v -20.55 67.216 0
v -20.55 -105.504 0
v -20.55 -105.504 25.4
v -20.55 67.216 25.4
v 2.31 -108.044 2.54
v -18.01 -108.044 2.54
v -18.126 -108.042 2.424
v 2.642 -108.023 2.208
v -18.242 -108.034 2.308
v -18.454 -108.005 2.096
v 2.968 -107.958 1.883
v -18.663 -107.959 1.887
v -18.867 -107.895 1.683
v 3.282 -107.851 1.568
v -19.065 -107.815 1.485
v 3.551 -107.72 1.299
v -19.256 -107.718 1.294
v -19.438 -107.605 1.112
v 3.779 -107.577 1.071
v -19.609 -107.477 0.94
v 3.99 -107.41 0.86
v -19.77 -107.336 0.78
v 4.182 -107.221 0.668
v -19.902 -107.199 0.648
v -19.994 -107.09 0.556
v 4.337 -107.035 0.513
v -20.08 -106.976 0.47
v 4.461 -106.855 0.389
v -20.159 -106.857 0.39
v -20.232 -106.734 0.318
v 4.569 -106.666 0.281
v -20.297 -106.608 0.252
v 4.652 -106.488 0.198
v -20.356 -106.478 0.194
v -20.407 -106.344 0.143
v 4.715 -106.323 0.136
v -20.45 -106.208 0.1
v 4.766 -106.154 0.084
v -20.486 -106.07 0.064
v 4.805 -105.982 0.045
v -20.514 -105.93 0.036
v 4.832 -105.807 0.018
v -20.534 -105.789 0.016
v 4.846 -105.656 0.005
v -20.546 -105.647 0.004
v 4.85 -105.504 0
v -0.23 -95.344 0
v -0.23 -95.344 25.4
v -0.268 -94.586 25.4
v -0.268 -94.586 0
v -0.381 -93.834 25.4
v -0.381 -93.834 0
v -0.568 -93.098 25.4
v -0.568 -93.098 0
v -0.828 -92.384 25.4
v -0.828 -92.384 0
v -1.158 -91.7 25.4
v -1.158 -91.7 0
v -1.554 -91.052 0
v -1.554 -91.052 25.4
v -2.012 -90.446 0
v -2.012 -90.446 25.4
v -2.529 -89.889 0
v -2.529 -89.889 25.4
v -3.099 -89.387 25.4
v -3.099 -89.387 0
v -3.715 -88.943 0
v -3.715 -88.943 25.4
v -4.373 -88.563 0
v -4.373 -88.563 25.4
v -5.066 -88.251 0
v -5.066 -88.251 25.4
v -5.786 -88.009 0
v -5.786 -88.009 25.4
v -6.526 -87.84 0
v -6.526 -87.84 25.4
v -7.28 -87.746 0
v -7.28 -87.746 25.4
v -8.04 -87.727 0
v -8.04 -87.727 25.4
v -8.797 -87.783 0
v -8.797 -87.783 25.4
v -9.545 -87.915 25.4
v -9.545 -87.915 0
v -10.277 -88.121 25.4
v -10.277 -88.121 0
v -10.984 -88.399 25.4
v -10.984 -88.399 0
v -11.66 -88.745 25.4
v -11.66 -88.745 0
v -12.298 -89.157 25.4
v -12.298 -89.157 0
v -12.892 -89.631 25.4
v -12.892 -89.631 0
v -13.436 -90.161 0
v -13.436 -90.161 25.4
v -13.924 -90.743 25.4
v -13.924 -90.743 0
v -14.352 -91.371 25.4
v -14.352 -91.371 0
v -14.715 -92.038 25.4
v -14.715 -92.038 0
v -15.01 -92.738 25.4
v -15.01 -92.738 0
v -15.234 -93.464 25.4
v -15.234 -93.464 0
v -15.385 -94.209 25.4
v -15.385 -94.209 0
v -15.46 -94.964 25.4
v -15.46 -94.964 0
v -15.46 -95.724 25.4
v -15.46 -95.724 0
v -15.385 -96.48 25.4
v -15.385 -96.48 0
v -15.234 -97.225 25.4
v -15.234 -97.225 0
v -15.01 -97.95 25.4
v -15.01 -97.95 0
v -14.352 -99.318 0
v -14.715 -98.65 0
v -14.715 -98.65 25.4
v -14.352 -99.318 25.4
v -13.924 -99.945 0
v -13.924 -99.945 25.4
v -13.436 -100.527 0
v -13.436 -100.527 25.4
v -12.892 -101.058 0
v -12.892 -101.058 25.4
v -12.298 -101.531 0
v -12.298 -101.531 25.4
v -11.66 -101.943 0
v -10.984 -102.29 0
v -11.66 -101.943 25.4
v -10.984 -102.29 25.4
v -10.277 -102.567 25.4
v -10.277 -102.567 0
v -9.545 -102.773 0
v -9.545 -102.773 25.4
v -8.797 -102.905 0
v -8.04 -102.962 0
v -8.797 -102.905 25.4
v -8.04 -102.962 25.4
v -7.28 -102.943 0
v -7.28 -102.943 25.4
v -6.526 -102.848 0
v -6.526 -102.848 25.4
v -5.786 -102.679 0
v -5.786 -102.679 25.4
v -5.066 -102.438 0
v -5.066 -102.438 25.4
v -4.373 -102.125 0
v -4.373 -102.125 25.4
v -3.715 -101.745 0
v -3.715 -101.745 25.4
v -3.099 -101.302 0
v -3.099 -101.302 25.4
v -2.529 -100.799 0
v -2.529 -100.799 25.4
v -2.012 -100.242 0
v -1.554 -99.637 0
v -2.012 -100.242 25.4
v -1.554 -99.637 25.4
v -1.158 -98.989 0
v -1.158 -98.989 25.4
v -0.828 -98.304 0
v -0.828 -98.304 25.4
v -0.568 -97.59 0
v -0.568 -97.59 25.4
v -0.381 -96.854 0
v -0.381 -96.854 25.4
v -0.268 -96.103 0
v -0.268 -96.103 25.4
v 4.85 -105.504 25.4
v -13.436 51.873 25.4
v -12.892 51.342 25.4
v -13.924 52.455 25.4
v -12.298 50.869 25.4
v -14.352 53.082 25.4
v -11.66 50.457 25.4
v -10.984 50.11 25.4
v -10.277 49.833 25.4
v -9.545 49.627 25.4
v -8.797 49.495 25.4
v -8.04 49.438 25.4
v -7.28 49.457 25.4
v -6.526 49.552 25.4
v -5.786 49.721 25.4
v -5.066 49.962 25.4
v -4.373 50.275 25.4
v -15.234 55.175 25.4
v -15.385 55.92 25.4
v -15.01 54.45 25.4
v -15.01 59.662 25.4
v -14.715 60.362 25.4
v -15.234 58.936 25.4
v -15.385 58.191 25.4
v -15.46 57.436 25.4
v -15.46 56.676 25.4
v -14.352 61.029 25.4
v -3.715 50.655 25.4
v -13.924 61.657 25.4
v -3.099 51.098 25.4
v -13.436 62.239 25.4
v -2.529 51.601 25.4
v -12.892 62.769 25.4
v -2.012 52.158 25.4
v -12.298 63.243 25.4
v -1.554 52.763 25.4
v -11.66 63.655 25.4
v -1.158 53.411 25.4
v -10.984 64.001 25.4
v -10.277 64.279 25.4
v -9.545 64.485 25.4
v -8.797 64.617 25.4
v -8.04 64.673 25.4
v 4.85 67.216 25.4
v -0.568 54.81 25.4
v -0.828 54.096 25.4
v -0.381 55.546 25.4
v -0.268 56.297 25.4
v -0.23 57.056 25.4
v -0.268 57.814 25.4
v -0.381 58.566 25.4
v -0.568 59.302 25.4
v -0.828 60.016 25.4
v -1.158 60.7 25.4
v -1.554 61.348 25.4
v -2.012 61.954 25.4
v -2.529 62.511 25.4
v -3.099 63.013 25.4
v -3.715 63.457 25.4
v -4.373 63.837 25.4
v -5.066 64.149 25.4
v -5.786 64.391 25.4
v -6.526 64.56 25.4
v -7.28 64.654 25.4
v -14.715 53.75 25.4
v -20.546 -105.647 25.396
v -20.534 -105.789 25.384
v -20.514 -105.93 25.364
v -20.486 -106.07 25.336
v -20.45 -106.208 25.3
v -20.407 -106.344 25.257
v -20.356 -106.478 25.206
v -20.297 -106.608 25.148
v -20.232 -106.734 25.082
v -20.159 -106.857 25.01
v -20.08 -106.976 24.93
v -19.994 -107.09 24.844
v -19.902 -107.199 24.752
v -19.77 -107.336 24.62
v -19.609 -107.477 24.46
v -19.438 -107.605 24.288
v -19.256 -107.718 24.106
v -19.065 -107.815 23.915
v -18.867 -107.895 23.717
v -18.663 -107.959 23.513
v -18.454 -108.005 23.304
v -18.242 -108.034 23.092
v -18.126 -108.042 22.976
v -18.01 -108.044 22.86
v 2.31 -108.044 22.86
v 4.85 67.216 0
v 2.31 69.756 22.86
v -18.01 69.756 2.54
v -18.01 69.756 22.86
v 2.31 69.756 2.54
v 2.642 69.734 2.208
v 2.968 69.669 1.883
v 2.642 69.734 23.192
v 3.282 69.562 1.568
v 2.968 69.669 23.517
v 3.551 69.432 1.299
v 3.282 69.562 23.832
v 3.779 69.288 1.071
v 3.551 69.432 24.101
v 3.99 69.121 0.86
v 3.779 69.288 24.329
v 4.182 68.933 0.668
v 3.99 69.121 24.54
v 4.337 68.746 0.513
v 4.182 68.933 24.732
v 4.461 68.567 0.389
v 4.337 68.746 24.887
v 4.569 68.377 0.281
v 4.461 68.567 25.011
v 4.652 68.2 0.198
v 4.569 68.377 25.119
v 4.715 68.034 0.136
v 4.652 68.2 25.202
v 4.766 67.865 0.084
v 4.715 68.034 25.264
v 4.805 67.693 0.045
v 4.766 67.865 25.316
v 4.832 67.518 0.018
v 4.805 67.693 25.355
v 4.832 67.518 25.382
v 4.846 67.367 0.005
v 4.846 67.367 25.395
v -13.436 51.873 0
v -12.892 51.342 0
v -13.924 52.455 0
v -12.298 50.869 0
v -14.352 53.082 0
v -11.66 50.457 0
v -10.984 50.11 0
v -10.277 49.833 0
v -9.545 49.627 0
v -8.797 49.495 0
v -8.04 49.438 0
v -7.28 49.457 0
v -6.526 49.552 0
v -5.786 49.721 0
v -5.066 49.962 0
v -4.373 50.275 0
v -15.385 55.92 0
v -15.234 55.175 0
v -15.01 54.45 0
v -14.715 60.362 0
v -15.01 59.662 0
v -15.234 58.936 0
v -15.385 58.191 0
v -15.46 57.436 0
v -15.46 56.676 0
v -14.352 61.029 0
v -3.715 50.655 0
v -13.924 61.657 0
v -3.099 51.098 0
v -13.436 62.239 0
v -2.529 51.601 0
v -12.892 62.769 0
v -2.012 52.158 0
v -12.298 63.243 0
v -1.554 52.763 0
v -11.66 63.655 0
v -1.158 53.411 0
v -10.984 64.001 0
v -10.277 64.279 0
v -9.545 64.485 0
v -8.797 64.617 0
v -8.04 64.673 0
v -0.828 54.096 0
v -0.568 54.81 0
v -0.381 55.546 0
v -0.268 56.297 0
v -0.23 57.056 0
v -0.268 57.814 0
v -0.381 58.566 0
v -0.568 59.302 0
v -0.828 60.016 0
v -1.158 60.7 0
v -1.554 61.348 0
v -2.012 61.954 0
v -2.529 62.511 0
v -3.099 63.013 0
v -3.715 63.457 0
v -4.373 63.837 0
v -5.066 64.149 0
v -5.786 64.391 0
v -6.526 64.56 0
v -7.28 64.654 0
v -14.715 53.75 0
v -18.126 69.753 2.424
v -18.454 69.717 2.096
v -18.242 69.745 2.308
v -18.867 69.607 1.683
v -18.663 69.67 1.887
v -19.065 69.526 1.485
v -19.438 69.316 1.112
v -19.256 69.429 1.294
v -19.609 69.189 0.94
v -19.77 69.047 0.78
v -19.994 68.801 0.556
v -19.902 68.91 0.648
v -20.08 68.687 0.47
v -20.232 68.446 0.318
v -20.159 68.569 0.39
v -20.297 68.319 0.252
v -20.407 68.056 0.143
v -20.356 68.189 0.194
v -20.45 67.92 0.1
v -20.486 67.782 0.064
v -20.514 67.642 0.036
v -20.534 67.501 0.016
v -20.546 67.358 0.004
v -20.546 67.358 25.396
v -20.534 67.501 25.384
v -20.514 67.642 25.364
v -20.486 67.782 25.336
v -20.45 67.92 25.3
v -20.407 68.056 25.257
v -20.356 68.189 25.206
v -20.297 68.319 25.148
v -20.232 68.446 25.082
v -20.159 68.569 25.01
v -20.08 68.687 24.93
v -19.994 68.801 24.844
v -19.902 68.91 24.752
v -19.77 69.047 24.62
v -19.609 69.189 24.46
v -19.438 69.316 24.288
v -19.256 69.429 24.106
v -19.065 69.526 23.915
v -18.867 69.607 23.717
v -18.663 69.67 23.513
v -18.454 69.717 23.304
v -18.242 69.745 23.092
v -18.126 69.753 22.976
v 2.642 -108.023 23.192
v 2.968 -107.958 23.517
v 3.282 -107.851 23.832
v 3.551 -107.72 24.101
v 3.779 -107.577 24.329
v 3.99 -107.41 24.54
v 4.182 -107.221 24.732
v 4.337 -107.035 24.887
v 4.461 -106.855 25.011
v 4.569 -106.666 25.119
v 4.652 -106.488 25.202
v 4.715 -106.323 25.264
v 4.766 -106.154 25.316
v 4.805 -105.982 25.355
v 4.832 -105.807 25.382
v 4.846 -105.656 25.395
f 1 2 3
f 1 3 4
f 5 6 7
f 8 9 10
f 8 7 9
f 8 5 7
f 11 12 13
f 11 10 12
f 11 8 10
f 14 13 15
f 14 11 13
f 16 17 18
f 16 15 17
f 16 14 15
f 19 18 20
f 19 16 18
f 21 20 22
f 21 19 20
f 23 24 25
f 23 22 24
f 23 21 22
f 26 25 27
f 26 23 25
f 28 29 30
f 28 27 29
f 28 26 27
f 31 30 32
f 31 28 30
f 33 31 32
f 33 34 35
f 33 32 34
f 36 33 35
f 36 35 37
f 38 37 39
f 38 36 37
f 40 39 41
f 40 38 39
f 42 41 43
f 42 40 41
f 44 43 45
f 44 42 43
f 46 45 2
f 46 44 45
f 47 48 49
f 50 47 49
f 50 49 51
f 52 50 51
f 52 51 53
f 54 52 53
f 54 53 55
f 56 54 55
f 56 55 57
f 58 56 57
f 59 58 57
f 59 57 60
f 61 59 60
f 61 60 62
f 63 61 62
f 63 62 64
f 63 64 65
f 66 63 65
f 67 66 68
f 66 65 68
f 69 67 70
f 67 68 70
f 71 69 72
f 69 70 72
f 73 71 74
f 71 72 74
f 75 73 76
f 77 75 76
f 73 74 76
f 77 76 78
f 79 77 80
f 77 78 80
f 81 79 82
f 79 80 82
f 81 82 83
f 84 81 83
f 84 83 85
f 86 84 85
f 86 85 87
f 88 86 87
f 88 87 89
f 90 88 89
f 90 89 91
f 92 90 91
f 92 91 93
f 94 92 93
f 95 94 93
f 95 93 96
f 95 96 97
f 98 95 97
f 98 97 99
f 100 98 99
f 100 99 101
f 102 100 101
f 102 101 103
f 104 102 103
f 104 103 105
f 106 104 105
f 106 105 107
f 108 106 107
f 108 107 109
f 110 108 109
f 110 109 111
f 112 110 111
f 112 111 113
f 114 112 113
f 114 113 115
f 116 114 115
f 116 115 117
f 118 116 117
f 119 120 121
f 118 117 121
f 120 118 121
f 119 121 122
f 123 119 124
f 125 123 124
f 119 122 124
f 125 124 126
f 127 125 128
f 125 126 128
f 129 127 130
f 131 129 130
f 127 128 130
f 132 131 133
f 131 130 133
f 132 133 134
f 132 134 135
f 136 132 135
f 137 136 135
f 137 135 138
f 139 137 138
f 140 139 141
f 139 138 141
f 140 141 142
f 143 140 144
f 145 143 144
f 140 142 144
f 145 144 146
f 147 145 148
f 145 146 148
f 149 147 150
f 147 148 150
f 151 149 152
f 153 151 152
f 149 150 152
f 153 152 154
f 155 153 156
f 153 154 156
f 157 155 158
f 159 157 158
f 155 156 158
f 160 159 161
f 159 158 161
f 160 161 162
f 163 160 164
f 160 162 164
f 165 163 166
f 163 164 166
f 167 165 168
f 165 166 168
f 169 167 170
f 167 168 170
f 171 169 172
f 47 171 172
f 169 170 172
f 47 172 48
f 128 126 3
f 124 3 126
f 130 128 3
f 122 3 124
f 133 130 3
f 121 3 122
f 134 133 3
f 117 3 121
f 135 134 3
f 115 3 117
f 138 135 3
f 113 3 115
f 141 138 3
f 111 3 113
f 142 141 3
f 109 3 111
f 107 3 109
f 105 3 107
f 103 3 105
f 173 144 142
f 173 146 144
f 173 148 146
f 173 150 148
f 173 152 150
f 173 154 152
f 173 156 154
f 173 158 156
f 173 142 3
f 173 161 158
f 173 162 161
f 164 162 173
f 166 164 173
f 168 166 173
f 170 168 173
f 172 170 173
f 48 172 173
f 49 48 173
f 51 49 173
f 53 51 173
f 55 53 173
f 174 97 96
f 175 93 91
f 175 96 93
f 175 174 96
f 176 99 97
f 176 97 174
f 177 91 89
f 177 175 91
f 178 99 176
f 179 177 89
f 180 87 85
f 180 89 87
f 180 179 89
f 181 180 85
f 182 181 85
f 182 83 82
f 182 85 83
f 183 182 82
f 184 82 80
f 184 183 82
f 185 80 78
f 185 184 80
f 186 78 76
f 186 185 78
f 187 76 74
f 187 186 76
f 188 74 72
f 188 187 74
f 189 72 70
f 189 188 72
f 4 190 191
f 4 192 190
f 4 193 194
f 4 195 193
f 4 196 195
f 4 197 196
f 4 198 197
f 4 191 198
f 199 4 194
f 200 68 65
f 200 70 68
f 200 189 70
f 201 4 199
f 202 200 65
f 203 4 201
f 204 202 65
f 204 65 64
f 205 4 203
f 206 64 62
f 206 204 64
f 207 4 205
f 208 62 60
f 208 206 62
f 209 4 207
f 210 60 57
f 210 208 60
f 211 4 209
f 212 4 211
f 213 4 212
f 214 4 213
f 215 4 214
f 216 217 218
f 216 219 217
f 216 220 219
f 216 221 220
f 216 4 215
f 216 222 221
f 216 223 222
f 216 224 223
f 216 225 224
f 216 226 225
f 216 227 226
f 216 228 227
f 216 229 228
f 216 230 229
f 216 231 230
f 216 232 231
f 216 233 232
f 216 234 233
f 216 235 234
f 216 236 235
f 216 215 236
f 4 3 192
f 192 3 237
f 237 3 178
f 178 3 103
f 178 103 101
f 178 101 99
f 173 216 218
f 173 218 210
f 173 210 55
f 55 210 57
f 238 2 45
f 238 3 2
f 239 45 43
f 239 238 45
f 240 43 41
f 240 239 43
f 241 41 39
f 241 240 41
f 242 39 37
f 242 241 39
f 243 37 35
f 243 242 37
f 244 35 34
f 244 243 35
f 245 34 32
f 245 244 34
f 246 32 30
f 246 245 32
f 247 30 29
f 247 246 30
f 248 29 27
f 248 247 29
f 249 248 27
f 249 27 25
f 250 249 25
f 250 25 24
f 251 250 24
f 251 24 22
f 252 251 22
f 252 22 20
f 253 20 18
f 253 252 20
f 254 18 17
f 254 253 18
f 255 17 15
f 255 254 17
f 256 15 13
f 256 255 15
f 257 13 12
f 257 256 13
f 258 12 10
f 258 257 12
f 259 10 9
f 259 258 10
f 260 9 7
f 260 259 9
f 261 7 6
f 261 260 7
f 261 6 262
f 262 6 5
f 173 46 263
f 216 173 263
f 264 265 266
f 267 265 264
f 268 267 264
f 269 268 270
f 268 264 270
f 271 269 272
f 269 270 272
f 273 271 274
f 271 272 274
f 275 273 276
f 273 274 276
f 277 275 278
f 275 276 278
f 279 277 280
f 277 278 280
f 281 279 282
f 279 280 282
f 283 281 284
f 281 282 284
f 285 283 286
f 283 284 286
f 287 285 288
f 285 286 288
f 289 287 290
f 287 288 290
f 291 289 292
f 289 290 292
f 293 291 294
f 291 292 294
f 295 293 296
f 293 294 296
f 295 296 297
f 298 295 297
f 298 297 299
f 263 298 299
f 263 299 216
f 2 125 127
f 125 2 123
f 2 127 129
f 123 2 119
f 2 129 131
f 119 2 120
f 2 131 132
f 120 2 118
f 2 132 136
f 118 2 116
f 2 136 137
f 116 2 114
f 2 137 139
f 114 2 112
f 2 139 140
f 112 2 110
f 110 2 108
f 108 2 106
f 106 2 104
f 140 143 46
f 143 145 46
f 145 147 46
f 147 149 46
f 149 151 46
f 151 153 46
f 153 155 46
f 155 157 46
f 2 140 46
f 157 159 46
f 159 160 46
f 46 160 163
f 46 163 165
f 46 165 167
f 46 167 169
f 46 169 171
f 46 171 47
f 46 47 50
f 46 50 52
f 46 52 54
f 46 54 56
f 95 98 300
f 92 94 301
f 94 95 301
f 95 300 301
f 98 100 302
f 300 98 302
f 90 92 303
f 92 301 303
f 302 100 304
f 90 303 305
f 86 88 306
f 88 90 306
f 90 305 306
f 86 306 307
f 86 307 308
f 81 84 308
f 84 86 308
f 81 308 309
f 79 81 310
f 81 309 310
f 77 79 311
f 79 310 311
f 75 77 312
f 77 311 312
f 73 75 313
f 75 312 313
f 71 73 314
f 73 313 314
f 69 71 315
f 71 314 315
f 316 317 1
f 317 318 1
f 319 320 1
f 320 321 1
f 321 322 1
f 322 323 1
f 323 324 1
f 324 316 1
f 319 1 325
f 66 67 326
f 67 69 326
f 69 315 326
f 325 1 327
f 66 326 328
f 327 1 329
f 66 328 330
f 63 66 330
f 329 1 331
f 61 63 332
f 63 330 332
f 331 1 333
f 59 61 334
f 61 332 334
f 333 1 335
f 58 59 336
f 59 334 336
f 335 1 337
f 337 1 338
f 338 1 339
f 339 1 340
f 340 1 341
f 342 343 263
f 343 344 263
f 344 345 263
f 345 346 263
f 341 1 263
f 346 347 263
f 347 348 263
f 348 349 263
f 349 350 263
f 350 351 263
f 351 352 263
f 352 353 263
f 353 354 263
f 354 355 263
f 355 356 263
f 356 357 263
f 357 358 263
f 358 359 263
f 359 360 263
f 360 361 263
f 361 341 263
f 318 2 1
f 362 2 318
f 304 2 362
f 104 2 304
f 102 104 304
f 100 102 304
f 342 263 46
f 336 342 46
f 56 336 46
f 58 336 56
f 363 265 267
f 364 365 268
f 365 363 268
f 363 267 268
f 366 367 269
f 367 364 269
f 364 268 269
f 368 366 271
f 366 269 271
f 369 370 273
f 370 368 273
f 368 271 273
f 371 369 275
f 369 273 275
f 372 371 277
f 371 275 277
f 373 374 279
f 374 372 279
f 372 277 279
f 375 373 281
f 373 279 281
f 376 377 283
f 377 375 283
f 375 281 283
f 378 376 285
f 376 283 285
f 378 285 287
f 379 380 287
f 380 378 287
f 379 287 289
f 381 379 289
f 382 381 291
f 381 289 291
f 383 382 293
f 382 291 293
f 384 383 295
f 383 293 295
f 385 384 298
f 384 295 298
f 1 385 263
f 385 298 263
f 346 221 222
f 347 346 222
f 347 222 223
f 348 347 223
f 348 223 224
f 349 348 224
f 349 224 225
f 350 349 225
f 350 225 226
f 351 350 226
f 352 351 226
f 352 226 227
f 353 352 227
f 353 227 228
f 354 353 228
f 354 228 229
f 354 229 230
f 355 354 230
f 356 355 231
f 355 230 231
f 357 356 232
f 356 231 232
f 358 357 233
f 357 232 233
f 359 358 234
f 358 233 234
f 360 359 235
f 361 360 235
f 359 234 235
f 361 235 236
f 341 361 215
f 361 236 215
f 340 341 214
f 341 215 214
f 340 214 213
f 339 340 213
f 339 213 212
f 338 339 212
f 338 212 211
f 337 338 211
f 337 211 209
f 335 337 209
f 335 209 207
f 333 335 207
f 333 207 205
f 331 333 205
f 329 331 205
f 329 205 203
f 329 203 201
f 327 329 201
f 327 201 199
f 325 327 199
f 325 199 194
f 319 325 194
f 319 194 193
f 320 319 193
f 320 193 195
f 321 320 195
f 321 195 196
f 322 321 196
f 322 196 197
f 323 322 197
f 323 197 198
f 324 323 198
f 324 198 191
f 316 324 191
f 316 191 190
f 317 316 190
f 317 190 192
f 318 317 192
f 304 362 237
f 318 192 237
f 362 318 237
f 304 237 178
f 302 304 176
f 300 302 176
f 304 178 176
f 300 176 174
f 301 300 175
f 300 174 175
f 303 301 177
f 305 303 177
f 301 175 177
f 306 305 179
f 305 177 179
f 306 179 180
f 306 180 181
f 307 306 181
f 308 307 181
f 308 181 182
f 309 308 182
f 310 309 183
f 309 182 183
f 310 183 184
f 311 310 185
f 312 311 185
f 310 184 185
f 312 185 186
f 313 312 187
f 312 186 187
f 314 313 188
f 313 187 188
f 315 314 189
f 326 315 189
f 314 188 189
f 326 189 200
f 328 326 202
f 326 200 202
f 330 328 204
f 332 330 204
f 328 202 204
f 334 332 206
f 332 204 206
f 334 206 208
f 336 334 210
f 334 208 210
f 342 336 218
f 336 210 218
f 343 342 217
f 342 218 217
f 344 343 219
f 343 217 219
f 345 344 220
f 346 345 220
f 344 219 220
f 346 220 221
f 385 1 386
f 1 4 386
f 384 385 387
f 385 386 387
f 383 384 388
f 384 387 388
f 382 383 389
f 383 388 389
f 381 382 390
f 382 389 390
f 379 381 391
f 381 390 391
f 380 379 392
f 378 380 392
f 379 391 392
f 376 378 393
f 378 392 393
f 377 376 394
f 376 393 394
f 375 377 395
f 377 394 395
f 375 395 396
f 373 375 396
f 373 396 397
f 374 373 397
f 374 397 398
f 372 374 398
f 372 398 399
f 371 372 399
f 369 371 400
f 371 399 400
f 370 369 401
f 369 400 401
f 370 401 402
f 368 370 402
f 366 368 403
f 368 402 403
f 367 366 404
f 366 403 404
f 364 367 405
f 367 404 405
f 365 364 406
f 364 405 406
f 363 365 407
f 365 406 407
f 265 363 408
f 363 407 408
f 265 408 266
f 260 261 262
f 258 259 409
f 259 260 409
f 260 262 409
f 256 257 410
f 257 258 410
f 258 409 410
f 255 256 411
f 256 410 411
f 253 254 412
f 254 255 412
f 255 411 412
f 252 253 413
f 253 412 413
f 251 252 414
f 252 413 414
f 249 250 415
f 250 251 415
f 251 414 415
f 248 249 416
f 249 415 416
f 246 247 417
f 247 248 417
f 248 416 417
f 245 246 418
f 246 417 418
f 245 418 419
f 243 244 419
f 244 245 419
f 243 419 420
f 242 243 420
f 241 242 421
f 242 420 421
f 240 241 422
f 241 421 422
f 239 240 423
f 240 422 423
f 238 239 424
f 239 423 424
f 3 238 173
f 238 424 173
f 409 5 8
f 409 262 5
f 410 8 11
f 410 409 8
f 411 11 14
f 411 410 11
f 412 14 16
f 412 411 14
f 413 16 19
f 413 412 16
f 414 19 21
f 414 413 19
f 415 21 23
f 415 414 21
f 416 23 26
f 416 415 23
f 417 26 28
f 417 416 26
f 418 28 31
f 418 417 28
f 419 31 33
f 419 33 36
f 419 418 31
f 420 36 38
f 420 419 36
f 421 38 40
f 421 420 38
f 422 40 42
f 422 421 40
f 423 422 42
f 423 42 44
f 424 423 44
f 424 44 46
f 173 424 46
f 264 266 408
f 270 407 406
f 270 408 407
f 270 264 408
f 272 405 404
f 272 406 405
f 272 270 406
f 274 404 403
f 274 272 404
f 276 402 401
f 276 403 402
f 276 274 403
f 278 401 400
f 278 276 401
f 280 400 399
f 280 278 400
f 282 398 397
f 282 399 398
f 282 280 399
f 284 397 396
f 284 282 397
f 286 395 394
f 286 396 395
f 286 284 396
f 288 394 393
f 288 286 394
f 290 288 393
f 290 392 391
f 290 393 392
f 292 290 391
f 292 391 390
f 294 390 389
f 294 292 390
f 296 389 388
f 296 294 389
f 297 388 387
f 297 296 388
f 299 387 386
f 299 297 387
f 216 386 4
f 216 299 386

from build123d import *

# Parameters (mm, degrees)
SKETCH1_W          = 25.4
SKETCH1_H          = 177.8
BASE_EXTRUDE_DEPTH = 25.4
SKETCH2_R          = 7.62
CUT_EXTRUDE1_DEPTH = 78.74
FILLET1_R          = 2.54


with BuildPart() as part:
    # Sketch1 → Base-Extrude (new body)
    with BuildSketch(Plane.XY):
        with Locations((-7.849662618, -19.144264507)):
            Rectangle(SKETCH1_W, SKETCH1_H)
    extrude(amount=BASE_EXTRUDE_DEPTH)

    # Sketch2 → Cut-Extrude1 (cut)
    with BuildSketch(Plane.XY.offset(25.4)):
        with Locations((-7.849662618, -95.344264507)):
            Circle(SKETCH2_R)
        with Locations((-7.849662618, 57.055735493)):
            Circle(SKETCH2_R)
    extrude(amount=-CUT_EXTRUDE1_DEPTH, mode=Mode.SUBTRACT)

    # Fillet1
    fillet1_edges = [part.edges().sort_by_distance(p)[0] for p in [
        (-20.549662618, 69.755735493, 12.7),
        (4.850337382, 69.755735493, 12.7),
        (-7.849662618, 69.755735493, 0),
        (-7.849662618, 69.755735493, 25.4),
        (-20.549662618, -108.044264507, 12.7),
        (4.850337382, -108.044264507, 12.7),
        (-7.849662618, -108.044264507, 0),
        (-7.849662618, -108.044264507, 25.4),
    ]]
    fillet(fillet1_edges, radius=FILLET1_R)


solid = part.part
